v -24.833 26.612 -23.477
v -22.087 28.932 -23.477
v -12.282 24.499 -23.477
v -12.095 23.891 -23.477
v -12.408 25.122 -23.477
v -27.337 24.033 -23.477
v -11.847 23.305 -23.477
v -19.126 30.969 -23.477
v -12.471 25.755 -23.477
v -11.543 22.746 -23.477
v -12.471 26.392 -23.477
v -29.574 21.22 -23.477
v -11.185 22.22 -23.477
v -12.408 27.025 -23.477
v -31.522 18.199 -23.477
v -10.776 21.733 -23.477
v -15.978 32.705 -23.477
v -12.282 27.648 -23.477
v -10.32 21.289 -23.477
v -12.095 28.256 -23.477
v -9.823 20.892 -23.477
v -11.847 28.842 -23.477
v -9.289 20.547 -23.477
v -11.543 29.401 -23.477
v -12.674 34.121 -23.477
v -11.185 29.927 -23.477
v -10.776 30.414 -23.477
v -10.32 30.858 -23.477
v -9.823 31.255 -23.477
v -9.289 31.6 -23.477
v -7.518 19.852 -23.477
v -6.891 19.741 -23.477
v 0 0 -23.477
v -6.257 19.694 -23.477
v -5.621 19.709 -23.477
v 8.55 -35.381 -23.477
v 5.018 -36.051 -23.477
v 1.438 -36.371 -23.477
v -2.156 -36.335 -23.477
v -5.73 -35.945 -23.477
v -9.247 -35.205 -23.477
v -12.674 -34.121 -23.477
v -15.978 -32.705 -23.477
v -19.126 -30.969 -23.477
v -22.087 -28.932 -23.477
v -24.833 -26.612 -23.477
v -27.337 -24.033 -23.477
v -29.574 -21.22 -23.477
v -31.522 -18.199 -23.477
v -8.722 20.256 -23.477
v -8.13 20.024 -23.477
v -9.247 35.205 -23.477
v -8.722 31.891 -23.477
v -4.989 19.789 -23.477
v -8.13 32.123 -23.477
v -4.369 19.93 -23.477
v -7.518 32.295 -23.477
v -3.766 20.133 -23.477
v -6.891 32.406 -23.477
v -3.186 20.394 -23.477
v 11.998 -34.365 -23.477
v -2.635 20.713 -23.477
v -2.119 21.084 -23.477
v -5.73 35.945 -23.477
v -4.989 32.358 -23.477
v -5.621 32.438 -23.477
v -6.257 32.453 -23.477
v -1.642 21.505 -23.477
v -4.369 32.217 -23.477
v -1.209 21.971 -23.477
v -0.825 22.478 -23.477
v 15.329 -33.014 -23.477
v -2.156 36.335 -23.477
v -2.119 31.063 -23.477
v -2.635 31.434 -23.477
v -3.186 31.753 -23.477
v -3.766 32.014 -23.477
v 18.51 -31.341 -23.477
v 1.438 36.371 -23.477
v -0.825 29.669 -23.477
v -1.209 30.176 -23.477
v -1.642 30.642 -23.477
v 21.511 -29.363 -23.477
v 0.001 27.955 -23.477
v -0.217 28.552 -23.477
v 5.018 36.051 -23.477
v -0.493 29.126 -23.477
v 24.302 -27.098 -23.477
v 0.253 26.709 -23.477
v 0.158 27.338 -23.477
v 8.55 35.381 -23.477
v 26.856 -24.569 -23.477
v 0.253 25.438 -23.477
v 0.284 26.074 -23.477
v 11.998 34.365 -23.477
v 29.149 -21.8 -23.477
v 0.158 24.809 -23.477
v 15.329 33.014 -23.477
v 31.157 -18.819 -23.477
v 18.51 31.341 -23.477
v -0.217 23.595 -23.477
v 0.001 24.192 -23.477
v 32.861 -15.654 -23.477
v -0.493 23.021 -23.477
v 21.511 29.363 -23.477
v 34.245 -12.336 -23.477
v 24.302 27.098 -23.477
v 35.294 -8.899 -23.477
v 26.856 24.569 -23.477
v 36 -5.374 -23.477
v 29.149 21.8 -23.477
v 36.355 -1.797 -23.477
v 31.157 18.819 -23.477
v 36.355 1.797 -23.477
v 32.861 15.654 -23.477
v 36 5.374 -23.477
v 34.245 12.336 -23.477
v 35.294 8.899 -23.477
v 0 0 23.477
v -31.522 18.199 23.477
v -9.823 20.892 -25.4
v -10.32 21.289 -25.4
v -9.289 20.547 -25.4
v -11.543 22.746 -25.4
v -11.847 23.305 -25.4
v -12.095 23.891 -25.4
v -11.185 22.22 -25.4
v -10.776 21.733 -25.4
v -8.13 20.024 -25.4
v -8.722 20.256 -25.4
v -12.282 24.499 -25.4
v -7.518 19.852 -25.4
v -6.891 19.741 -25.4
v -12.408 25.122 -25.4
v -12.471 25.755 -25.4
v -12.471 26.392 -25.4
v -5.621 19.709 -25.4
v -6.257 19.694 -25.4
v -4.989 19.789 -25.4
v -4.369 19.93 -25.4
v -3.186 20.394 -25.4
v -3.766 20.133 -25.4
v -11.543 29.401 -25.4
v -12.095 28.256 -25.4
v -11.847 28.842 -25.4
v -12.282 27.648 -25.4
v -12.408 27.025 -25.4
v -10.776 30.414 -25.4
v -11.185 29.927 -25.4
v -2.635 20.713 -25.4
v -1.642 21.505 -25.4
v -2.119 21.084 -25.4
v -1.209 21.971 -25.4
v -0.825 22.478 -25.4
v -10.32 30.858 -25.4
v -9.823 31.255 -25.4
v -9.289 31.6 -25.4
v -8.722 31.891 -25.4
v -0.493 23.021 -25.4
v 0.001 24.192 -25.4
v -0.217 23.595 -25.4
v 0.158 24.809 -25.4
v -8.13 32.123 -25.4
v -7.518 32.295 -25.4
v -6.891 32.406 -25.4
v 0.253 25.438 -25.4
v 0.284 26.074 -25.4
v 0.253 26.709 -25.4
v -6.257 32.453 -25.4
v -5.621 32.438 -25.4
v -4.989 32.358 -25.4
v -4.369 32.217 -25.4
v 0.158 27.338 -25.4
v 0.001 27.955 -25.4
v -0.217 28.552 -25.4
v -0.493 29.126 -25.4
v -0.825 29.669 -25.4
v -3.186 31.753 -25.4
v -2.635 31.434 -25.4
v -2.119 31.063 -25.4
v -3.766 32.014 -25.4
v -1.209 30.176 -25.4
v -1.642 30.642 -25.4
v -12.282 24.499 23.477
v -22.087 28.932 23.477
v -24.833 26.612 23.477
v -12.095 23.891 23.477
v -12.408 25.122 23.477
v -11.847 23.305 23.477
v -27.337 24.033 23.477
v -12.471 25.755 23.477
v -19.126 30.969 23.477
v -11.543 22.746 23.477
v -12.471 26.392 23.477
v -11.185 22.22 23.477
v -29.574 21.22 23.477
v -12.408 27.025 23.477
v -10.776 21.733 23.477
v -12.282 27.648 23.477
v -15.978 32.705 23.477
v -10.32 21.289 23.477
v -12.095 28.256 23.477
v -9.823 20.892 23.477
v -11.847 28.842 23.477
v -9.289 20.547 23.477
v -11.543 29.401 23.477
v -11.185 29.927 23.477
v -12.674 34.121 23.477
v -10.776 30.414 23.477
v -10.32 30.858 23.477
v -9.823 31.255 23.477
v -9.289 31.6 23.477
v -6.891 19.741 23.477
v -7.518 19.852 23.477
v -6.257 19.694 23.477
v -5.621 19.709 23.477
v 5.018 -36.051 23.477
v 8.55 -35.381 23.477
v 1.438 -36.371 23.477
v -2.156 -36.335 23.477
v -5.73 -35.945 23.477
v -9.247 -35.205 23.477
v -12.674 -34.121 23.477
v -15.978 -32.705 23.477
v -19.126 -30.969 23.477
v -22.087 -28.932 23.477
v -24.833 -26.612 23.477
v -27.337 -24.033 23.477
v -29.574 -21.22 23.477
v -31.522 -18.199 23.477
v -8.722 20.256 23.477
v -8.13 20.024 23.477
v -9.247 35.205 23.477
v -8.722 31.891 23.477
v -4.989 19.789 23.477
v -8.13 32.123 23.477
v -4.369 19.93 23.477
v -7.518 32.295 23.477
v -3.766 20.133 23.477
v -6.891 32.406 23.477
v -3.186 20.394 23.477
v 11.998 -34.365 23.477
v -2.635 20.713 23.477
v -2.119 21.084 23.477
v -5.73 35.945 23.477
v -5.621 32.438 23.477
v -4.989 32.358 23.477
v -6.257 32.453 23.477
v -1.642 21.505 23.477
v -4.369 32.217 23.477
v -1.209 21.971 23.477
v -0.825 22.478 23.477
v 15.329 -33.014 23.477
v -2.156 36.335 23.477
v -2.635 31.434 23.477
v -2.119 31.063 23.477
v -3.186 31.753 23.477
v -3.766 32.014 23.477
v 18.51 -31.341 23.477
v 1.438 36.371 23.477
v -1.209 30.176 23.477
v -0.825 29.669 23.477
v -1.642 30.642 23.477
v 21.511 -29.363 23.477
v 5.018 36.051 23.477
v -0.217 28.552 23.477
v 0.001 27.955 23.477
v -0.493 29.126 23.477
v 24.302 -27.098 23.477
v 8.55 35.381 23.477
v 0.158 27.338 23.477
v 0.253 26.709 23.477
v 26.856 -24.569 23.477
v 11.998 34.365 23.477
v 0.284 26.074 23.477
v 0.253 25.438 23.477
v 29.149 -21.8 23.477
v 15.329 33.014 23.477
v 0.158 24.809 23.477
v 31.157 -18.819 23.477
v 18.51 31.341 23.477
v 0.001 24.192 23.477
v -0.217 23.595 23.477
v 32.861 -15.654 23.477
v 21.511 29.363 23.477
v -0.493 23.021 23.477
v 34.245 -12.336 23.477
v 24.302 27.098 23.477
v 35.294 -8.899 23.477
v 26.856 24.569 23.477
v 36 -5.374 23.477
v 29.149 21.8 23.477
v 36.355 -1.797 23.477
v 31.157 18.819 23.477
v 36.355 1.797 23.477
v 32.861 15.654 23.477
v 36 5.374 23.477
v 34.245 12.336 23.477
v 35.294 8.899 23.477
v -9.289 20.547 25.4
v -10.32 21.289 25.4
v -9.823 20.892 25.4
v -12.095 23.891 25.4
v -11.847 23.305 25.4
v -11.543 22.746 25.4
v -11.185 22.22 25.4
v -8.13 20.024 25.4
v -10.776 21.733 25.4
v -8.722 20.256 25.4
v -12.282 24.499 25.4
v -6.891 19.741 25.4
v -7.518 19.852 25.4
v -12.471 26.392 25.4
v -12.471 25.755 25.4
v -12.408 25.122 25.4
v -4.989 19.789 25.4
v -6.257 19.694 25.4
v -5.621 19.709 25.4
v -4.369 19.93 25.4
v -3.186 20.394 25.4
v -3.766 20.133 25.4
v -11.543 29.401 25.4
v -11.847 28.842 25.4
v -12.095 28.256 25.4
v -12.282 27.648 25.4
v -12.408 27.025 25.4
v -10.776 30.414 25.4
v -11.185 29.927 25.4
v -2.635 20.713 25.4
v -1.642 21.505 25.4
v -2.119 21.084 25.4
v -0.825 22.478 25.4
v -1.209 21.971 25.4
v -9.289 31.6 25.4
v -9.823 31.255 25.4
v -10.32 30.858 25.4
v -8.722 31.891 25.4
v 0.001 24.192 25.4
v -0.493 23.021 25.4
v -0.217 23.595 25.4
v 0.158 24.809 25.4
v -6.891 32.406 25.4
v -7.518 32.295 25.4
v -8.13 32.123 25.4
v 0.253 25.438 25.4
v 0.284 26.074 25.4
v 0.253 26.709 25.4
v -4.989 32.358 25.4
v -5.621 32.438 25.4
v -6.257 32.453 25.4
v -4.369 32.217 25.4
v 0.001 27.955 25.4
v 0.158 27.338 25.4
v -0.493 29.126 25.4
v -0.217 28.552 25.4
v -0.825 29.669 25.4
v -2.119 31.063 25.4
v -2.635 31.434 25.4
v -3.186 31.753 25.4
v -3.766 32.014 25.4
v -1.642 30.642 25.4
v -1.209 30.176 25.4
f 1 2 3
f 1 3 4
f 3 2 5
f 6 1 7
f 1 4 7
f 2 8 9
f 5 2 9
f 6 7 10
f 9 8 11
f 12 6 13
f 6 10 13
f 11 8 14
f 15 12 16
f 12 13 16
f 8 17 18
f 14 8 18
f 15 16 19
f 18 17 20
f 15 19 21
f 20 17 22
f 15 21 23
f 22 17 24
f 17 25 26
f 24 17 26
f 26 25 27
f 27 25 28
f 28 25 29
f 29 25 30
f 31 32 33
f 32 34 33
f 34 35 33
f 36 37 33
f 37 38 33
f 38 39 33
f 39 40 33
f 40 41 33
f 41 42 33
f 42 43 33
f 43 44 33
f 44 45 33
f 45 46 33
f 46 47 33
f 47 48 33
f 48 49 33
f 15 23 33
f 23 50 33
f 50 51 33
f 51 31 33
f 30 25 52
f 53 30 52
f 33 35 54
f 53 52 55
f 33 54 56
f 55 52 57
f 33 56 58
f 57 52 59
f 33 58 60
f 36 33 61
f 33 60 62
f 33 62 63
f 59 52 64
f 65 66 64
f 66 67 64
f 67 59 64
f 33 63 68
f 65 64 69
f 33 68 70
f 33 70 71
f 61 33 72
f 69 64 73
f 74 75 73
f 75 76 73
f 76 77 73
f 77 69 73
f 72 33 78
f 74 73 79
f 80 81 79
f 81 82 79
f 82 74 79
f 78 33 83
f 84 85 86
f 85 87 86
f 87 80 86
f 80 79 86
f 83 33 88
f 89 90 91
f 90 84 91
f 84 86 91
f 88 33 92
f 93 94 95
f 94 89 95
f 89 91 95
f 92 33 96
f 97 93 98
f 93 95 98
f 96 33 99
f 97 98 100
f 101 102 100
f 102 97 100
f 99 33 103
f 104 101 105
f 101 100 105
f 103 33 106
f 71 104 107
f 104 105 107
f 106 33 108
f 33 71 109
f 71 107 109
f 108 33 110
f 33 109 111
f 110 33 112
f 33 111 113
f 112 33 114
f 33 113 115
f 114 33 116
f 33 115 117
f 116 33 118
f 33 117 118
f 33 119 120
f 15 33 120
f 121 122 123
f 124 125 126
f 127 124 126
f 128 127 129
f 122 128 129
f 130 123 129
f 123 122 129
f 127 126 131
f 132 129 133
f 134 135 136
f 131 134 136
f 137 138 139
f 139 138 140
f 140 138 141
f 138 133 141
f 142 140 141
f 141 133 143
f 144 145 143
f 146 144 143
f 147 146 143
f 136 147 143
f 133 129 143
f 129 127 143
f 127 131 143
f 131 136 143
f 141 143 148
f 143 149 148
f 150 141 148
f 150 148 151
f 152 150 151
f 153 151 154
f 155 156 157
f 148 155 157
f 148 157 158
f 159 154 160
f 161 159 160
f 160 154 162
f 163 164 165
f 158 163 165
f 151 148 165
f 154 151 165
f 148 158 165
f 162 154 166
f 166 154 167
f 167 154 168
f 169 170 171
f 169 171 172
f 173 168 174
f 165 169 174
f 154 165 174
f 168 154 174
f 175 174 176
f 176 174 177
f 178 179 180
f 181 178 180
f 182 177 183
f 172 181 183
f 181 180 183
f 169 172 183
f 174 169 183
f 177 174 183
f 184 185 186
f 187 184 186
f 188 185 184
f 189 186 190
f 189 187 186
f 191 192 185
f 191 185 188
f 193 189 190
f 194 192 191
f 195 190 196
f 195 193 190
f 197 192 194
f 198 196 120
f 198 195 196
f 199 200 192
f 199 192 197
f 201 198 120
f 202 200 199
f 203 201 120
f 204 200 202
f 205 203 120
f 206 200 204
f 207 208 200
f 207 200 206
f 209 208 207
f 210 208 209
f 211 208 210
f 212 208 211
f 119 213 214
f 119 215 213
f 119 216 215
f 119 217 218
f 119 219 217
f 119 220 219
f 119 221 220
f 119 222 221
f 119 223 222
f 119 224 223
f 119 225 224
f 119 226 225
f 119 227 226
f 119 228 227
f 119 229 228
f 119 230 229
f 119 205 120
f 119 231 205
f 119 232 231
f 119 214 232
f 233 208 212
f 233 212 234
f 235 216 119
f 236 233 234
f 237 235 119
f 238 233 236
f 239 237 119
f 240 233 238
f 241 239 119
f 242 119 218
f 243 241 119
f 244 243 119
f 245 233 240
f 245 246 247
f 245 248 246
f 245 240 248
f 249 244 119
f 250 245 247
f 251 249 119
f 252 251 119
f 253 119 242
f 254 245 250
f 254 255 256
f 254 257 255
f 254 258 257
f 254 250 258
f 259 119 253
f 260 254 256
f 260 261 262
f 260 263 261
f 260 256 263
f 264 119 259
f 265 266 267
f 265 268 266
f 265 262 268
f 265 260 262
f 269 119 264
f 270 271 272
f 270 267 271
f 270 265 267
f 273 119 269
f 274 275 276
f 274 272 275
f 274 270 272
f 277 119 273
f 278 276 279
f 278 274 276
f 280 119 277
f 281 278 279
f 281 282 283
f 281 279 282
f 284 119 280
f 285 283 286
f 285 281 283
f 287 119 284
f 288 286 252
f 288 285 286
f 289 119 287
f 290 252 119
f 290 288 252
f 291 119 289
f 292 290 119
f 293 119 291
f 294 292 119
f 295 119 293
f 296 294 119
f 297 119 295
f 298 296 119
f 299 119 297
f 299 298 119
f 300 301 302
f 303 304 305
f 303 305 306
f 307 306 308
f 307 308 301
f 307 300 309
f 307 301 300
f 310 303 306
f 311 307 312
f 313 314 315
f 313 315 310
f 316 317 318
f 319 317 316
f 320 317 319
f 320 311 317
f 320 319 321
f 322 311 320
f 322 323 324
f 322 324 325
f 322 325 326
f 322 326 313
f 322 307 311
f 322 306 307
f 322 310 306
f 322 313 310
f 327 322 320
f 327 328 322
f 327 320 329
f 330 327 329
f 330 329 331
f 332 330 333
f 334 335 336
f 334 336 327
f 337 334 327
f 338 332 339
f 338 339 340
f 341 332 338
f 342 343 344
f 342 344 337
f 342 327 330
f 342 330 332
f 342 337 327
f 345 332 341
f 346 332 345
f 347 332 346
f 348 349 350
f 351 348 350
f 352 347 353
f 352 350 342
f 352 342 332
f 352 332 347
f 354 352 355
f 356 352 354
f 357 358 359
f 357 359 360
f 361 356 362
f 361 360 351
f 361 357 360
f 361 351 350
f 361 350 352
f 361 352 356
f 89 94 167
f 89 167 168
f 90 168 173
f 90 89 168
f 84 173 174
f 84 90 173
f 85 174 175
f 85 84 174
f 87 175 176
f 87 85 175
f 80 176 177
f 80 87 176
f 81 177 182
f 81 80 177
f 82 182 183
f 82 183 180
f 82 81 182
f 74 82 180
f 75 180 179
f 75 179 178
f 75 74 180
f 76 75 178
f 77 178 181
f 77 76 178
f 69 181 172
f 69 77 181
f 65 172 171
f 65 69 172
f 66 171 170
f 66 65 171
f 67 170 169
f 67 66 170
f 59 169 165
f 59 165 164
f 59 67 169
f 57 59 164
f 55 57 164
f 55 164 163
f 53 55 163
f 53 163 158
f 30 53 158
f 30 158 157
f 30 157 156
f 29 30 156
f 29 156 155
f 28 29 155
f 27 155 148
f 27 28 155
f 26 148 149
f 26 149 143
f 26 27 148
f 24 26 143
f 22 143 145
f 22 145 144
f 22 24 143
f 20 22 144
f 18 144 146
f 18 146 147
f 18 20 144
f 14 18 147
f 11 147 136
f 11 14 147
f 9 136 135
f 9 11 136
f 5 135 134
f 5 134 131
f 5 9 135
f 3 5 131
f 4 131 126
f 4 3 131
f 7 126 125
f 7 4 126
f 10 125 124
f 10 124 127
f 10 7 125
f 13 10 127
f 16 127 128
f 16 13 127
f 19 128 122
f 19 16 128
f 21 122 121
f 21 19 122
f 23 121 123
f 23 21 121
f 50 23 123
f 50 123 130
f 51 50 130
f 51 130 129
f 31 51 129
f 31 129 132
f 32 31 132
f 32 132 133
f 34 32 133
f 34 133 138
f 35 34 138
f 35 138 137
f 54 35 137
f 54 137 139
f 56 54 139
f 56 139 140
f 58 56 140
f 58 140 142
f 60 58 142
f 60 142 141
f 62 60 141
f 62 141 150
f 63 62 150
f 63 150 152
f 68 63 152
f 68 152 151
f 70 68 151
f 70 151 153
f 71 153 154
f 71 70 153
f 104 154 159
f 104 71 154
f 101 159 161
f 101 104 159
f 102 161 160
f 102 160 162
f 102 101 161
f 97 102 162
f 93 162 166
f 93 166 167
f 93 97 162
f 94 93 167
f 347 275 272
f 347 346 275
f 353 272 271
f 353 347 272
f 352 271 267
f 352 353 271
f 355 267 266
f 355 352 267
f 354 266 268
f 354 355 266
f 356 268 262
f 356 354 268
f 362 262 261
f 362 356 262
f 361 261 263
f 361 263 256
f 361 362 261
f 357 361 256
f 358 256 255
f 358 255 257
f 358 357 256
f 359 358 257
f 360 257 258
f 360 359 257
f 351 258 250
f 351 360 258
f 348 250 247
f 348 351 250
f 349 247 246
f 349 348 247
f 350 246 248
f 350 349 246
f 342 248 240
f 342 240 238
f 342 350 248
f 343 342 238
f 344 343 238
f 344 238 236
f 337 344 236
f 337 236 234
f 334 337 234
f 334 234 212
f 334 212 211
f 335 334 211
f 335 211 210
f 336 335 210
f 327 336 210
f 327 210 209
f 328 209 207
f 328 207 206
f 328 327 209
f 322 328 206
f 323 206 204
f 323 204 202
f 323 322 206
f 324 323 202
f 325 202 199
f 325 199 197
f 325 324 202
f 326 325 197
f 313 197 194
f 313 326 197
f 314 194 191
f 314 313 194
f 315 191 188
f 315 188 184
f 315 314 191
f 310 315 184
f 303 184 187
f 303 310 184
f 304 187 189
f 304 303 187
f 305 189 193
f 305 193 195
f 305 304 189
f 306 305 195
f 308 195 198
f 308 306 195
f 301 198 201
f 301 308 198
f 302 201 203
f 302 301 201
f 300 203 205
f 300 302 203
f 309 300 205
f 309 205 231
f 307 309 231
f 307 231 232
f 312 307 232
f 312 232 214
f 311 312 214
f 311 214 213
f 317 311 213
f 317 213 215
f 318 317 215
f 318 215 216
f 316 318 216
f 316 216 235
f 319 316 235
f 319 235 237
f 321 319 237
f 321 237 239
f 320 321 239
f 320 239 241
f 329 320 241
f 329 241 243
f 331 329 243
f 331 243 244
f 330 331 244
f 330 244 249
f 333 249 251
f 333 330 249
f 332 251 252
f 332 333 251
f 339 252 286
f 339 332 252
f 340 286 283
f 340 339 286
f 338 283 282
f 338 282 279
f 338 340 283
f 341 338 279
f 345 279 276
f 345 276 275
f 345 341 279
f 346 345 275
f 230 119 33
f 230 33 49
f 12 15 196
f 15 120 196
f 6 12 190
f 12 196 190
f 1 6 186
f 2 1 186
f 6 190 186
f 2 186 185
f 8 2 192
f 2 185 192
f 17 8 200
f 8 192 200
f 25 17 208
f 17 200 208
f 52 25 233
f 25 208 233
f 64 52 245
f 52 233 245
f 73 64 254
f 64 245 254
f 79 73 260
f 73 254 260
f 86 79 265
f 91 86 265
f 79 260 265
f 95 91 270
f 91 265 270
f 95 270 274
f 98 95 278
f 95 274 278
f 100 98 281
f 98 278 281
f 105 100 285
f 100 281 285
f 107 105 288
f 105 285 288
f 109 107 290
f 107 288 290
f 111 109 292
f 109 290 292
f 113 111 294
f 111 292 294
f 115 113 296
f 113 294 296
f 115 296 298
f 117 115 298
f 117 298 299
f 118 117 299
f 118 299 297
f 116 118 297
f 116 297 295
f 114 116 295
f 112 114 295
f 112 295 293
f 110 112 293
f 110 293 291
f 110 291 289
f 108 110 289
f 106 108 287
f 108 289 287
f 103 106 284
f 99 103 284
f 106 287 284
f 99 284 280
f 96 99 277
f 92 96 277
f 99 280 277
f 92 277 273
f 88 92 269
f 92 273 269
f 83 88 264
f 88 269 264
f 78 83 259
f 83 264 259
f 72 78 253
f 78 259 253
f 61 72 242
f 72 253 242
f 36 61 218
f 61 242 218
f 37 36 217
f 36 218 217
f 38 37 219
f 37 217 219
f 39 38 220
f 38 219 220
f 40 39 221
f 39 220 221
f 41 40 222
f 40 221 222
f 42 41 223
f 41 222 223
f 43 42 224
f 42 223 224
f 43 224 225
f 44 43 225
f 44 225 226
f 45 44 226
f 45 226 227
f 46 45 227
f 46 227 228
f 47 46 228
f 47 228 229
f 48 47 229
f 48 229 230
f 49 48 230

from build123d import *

# Parameters (mm, degrees)
F0_W          = 36.3989807665
F0_H          = 46.9546951354
F1_ANGLE_BACK = 150
F1_ANGLE      = 300
F2_R          = 6.3818530104
F3_DEPTH      = 25.4


with BuildPart() as f1:
    # F0 (on Front) → F1 (revolve)
    with BuildSketch(Plane.XZ, mode=Mode.PRIVATE) as f1_sk:
        with Locations((18.1994903833, 0)):
            Rectangle(F0_W, F0_H)
    revolve(f1_sk.sketch.rotate(Axis((0, 0, 0), (0, 0, -1)), -F1_ANGLE_BACK), axis=Axis((0, 0, 0), (0, 0, -1)), revolution_arc=F1_ANGLE)

    # F2 (on Top) → F3 (join, symmetric)
    with BuildSketch(Plane.XY):
        with Locations((-6.0975761153, 26.0735042393)):
            Circle(F2_R)
    extrude(amount=F3_DEPTH, both=True)


solid = f1.part
